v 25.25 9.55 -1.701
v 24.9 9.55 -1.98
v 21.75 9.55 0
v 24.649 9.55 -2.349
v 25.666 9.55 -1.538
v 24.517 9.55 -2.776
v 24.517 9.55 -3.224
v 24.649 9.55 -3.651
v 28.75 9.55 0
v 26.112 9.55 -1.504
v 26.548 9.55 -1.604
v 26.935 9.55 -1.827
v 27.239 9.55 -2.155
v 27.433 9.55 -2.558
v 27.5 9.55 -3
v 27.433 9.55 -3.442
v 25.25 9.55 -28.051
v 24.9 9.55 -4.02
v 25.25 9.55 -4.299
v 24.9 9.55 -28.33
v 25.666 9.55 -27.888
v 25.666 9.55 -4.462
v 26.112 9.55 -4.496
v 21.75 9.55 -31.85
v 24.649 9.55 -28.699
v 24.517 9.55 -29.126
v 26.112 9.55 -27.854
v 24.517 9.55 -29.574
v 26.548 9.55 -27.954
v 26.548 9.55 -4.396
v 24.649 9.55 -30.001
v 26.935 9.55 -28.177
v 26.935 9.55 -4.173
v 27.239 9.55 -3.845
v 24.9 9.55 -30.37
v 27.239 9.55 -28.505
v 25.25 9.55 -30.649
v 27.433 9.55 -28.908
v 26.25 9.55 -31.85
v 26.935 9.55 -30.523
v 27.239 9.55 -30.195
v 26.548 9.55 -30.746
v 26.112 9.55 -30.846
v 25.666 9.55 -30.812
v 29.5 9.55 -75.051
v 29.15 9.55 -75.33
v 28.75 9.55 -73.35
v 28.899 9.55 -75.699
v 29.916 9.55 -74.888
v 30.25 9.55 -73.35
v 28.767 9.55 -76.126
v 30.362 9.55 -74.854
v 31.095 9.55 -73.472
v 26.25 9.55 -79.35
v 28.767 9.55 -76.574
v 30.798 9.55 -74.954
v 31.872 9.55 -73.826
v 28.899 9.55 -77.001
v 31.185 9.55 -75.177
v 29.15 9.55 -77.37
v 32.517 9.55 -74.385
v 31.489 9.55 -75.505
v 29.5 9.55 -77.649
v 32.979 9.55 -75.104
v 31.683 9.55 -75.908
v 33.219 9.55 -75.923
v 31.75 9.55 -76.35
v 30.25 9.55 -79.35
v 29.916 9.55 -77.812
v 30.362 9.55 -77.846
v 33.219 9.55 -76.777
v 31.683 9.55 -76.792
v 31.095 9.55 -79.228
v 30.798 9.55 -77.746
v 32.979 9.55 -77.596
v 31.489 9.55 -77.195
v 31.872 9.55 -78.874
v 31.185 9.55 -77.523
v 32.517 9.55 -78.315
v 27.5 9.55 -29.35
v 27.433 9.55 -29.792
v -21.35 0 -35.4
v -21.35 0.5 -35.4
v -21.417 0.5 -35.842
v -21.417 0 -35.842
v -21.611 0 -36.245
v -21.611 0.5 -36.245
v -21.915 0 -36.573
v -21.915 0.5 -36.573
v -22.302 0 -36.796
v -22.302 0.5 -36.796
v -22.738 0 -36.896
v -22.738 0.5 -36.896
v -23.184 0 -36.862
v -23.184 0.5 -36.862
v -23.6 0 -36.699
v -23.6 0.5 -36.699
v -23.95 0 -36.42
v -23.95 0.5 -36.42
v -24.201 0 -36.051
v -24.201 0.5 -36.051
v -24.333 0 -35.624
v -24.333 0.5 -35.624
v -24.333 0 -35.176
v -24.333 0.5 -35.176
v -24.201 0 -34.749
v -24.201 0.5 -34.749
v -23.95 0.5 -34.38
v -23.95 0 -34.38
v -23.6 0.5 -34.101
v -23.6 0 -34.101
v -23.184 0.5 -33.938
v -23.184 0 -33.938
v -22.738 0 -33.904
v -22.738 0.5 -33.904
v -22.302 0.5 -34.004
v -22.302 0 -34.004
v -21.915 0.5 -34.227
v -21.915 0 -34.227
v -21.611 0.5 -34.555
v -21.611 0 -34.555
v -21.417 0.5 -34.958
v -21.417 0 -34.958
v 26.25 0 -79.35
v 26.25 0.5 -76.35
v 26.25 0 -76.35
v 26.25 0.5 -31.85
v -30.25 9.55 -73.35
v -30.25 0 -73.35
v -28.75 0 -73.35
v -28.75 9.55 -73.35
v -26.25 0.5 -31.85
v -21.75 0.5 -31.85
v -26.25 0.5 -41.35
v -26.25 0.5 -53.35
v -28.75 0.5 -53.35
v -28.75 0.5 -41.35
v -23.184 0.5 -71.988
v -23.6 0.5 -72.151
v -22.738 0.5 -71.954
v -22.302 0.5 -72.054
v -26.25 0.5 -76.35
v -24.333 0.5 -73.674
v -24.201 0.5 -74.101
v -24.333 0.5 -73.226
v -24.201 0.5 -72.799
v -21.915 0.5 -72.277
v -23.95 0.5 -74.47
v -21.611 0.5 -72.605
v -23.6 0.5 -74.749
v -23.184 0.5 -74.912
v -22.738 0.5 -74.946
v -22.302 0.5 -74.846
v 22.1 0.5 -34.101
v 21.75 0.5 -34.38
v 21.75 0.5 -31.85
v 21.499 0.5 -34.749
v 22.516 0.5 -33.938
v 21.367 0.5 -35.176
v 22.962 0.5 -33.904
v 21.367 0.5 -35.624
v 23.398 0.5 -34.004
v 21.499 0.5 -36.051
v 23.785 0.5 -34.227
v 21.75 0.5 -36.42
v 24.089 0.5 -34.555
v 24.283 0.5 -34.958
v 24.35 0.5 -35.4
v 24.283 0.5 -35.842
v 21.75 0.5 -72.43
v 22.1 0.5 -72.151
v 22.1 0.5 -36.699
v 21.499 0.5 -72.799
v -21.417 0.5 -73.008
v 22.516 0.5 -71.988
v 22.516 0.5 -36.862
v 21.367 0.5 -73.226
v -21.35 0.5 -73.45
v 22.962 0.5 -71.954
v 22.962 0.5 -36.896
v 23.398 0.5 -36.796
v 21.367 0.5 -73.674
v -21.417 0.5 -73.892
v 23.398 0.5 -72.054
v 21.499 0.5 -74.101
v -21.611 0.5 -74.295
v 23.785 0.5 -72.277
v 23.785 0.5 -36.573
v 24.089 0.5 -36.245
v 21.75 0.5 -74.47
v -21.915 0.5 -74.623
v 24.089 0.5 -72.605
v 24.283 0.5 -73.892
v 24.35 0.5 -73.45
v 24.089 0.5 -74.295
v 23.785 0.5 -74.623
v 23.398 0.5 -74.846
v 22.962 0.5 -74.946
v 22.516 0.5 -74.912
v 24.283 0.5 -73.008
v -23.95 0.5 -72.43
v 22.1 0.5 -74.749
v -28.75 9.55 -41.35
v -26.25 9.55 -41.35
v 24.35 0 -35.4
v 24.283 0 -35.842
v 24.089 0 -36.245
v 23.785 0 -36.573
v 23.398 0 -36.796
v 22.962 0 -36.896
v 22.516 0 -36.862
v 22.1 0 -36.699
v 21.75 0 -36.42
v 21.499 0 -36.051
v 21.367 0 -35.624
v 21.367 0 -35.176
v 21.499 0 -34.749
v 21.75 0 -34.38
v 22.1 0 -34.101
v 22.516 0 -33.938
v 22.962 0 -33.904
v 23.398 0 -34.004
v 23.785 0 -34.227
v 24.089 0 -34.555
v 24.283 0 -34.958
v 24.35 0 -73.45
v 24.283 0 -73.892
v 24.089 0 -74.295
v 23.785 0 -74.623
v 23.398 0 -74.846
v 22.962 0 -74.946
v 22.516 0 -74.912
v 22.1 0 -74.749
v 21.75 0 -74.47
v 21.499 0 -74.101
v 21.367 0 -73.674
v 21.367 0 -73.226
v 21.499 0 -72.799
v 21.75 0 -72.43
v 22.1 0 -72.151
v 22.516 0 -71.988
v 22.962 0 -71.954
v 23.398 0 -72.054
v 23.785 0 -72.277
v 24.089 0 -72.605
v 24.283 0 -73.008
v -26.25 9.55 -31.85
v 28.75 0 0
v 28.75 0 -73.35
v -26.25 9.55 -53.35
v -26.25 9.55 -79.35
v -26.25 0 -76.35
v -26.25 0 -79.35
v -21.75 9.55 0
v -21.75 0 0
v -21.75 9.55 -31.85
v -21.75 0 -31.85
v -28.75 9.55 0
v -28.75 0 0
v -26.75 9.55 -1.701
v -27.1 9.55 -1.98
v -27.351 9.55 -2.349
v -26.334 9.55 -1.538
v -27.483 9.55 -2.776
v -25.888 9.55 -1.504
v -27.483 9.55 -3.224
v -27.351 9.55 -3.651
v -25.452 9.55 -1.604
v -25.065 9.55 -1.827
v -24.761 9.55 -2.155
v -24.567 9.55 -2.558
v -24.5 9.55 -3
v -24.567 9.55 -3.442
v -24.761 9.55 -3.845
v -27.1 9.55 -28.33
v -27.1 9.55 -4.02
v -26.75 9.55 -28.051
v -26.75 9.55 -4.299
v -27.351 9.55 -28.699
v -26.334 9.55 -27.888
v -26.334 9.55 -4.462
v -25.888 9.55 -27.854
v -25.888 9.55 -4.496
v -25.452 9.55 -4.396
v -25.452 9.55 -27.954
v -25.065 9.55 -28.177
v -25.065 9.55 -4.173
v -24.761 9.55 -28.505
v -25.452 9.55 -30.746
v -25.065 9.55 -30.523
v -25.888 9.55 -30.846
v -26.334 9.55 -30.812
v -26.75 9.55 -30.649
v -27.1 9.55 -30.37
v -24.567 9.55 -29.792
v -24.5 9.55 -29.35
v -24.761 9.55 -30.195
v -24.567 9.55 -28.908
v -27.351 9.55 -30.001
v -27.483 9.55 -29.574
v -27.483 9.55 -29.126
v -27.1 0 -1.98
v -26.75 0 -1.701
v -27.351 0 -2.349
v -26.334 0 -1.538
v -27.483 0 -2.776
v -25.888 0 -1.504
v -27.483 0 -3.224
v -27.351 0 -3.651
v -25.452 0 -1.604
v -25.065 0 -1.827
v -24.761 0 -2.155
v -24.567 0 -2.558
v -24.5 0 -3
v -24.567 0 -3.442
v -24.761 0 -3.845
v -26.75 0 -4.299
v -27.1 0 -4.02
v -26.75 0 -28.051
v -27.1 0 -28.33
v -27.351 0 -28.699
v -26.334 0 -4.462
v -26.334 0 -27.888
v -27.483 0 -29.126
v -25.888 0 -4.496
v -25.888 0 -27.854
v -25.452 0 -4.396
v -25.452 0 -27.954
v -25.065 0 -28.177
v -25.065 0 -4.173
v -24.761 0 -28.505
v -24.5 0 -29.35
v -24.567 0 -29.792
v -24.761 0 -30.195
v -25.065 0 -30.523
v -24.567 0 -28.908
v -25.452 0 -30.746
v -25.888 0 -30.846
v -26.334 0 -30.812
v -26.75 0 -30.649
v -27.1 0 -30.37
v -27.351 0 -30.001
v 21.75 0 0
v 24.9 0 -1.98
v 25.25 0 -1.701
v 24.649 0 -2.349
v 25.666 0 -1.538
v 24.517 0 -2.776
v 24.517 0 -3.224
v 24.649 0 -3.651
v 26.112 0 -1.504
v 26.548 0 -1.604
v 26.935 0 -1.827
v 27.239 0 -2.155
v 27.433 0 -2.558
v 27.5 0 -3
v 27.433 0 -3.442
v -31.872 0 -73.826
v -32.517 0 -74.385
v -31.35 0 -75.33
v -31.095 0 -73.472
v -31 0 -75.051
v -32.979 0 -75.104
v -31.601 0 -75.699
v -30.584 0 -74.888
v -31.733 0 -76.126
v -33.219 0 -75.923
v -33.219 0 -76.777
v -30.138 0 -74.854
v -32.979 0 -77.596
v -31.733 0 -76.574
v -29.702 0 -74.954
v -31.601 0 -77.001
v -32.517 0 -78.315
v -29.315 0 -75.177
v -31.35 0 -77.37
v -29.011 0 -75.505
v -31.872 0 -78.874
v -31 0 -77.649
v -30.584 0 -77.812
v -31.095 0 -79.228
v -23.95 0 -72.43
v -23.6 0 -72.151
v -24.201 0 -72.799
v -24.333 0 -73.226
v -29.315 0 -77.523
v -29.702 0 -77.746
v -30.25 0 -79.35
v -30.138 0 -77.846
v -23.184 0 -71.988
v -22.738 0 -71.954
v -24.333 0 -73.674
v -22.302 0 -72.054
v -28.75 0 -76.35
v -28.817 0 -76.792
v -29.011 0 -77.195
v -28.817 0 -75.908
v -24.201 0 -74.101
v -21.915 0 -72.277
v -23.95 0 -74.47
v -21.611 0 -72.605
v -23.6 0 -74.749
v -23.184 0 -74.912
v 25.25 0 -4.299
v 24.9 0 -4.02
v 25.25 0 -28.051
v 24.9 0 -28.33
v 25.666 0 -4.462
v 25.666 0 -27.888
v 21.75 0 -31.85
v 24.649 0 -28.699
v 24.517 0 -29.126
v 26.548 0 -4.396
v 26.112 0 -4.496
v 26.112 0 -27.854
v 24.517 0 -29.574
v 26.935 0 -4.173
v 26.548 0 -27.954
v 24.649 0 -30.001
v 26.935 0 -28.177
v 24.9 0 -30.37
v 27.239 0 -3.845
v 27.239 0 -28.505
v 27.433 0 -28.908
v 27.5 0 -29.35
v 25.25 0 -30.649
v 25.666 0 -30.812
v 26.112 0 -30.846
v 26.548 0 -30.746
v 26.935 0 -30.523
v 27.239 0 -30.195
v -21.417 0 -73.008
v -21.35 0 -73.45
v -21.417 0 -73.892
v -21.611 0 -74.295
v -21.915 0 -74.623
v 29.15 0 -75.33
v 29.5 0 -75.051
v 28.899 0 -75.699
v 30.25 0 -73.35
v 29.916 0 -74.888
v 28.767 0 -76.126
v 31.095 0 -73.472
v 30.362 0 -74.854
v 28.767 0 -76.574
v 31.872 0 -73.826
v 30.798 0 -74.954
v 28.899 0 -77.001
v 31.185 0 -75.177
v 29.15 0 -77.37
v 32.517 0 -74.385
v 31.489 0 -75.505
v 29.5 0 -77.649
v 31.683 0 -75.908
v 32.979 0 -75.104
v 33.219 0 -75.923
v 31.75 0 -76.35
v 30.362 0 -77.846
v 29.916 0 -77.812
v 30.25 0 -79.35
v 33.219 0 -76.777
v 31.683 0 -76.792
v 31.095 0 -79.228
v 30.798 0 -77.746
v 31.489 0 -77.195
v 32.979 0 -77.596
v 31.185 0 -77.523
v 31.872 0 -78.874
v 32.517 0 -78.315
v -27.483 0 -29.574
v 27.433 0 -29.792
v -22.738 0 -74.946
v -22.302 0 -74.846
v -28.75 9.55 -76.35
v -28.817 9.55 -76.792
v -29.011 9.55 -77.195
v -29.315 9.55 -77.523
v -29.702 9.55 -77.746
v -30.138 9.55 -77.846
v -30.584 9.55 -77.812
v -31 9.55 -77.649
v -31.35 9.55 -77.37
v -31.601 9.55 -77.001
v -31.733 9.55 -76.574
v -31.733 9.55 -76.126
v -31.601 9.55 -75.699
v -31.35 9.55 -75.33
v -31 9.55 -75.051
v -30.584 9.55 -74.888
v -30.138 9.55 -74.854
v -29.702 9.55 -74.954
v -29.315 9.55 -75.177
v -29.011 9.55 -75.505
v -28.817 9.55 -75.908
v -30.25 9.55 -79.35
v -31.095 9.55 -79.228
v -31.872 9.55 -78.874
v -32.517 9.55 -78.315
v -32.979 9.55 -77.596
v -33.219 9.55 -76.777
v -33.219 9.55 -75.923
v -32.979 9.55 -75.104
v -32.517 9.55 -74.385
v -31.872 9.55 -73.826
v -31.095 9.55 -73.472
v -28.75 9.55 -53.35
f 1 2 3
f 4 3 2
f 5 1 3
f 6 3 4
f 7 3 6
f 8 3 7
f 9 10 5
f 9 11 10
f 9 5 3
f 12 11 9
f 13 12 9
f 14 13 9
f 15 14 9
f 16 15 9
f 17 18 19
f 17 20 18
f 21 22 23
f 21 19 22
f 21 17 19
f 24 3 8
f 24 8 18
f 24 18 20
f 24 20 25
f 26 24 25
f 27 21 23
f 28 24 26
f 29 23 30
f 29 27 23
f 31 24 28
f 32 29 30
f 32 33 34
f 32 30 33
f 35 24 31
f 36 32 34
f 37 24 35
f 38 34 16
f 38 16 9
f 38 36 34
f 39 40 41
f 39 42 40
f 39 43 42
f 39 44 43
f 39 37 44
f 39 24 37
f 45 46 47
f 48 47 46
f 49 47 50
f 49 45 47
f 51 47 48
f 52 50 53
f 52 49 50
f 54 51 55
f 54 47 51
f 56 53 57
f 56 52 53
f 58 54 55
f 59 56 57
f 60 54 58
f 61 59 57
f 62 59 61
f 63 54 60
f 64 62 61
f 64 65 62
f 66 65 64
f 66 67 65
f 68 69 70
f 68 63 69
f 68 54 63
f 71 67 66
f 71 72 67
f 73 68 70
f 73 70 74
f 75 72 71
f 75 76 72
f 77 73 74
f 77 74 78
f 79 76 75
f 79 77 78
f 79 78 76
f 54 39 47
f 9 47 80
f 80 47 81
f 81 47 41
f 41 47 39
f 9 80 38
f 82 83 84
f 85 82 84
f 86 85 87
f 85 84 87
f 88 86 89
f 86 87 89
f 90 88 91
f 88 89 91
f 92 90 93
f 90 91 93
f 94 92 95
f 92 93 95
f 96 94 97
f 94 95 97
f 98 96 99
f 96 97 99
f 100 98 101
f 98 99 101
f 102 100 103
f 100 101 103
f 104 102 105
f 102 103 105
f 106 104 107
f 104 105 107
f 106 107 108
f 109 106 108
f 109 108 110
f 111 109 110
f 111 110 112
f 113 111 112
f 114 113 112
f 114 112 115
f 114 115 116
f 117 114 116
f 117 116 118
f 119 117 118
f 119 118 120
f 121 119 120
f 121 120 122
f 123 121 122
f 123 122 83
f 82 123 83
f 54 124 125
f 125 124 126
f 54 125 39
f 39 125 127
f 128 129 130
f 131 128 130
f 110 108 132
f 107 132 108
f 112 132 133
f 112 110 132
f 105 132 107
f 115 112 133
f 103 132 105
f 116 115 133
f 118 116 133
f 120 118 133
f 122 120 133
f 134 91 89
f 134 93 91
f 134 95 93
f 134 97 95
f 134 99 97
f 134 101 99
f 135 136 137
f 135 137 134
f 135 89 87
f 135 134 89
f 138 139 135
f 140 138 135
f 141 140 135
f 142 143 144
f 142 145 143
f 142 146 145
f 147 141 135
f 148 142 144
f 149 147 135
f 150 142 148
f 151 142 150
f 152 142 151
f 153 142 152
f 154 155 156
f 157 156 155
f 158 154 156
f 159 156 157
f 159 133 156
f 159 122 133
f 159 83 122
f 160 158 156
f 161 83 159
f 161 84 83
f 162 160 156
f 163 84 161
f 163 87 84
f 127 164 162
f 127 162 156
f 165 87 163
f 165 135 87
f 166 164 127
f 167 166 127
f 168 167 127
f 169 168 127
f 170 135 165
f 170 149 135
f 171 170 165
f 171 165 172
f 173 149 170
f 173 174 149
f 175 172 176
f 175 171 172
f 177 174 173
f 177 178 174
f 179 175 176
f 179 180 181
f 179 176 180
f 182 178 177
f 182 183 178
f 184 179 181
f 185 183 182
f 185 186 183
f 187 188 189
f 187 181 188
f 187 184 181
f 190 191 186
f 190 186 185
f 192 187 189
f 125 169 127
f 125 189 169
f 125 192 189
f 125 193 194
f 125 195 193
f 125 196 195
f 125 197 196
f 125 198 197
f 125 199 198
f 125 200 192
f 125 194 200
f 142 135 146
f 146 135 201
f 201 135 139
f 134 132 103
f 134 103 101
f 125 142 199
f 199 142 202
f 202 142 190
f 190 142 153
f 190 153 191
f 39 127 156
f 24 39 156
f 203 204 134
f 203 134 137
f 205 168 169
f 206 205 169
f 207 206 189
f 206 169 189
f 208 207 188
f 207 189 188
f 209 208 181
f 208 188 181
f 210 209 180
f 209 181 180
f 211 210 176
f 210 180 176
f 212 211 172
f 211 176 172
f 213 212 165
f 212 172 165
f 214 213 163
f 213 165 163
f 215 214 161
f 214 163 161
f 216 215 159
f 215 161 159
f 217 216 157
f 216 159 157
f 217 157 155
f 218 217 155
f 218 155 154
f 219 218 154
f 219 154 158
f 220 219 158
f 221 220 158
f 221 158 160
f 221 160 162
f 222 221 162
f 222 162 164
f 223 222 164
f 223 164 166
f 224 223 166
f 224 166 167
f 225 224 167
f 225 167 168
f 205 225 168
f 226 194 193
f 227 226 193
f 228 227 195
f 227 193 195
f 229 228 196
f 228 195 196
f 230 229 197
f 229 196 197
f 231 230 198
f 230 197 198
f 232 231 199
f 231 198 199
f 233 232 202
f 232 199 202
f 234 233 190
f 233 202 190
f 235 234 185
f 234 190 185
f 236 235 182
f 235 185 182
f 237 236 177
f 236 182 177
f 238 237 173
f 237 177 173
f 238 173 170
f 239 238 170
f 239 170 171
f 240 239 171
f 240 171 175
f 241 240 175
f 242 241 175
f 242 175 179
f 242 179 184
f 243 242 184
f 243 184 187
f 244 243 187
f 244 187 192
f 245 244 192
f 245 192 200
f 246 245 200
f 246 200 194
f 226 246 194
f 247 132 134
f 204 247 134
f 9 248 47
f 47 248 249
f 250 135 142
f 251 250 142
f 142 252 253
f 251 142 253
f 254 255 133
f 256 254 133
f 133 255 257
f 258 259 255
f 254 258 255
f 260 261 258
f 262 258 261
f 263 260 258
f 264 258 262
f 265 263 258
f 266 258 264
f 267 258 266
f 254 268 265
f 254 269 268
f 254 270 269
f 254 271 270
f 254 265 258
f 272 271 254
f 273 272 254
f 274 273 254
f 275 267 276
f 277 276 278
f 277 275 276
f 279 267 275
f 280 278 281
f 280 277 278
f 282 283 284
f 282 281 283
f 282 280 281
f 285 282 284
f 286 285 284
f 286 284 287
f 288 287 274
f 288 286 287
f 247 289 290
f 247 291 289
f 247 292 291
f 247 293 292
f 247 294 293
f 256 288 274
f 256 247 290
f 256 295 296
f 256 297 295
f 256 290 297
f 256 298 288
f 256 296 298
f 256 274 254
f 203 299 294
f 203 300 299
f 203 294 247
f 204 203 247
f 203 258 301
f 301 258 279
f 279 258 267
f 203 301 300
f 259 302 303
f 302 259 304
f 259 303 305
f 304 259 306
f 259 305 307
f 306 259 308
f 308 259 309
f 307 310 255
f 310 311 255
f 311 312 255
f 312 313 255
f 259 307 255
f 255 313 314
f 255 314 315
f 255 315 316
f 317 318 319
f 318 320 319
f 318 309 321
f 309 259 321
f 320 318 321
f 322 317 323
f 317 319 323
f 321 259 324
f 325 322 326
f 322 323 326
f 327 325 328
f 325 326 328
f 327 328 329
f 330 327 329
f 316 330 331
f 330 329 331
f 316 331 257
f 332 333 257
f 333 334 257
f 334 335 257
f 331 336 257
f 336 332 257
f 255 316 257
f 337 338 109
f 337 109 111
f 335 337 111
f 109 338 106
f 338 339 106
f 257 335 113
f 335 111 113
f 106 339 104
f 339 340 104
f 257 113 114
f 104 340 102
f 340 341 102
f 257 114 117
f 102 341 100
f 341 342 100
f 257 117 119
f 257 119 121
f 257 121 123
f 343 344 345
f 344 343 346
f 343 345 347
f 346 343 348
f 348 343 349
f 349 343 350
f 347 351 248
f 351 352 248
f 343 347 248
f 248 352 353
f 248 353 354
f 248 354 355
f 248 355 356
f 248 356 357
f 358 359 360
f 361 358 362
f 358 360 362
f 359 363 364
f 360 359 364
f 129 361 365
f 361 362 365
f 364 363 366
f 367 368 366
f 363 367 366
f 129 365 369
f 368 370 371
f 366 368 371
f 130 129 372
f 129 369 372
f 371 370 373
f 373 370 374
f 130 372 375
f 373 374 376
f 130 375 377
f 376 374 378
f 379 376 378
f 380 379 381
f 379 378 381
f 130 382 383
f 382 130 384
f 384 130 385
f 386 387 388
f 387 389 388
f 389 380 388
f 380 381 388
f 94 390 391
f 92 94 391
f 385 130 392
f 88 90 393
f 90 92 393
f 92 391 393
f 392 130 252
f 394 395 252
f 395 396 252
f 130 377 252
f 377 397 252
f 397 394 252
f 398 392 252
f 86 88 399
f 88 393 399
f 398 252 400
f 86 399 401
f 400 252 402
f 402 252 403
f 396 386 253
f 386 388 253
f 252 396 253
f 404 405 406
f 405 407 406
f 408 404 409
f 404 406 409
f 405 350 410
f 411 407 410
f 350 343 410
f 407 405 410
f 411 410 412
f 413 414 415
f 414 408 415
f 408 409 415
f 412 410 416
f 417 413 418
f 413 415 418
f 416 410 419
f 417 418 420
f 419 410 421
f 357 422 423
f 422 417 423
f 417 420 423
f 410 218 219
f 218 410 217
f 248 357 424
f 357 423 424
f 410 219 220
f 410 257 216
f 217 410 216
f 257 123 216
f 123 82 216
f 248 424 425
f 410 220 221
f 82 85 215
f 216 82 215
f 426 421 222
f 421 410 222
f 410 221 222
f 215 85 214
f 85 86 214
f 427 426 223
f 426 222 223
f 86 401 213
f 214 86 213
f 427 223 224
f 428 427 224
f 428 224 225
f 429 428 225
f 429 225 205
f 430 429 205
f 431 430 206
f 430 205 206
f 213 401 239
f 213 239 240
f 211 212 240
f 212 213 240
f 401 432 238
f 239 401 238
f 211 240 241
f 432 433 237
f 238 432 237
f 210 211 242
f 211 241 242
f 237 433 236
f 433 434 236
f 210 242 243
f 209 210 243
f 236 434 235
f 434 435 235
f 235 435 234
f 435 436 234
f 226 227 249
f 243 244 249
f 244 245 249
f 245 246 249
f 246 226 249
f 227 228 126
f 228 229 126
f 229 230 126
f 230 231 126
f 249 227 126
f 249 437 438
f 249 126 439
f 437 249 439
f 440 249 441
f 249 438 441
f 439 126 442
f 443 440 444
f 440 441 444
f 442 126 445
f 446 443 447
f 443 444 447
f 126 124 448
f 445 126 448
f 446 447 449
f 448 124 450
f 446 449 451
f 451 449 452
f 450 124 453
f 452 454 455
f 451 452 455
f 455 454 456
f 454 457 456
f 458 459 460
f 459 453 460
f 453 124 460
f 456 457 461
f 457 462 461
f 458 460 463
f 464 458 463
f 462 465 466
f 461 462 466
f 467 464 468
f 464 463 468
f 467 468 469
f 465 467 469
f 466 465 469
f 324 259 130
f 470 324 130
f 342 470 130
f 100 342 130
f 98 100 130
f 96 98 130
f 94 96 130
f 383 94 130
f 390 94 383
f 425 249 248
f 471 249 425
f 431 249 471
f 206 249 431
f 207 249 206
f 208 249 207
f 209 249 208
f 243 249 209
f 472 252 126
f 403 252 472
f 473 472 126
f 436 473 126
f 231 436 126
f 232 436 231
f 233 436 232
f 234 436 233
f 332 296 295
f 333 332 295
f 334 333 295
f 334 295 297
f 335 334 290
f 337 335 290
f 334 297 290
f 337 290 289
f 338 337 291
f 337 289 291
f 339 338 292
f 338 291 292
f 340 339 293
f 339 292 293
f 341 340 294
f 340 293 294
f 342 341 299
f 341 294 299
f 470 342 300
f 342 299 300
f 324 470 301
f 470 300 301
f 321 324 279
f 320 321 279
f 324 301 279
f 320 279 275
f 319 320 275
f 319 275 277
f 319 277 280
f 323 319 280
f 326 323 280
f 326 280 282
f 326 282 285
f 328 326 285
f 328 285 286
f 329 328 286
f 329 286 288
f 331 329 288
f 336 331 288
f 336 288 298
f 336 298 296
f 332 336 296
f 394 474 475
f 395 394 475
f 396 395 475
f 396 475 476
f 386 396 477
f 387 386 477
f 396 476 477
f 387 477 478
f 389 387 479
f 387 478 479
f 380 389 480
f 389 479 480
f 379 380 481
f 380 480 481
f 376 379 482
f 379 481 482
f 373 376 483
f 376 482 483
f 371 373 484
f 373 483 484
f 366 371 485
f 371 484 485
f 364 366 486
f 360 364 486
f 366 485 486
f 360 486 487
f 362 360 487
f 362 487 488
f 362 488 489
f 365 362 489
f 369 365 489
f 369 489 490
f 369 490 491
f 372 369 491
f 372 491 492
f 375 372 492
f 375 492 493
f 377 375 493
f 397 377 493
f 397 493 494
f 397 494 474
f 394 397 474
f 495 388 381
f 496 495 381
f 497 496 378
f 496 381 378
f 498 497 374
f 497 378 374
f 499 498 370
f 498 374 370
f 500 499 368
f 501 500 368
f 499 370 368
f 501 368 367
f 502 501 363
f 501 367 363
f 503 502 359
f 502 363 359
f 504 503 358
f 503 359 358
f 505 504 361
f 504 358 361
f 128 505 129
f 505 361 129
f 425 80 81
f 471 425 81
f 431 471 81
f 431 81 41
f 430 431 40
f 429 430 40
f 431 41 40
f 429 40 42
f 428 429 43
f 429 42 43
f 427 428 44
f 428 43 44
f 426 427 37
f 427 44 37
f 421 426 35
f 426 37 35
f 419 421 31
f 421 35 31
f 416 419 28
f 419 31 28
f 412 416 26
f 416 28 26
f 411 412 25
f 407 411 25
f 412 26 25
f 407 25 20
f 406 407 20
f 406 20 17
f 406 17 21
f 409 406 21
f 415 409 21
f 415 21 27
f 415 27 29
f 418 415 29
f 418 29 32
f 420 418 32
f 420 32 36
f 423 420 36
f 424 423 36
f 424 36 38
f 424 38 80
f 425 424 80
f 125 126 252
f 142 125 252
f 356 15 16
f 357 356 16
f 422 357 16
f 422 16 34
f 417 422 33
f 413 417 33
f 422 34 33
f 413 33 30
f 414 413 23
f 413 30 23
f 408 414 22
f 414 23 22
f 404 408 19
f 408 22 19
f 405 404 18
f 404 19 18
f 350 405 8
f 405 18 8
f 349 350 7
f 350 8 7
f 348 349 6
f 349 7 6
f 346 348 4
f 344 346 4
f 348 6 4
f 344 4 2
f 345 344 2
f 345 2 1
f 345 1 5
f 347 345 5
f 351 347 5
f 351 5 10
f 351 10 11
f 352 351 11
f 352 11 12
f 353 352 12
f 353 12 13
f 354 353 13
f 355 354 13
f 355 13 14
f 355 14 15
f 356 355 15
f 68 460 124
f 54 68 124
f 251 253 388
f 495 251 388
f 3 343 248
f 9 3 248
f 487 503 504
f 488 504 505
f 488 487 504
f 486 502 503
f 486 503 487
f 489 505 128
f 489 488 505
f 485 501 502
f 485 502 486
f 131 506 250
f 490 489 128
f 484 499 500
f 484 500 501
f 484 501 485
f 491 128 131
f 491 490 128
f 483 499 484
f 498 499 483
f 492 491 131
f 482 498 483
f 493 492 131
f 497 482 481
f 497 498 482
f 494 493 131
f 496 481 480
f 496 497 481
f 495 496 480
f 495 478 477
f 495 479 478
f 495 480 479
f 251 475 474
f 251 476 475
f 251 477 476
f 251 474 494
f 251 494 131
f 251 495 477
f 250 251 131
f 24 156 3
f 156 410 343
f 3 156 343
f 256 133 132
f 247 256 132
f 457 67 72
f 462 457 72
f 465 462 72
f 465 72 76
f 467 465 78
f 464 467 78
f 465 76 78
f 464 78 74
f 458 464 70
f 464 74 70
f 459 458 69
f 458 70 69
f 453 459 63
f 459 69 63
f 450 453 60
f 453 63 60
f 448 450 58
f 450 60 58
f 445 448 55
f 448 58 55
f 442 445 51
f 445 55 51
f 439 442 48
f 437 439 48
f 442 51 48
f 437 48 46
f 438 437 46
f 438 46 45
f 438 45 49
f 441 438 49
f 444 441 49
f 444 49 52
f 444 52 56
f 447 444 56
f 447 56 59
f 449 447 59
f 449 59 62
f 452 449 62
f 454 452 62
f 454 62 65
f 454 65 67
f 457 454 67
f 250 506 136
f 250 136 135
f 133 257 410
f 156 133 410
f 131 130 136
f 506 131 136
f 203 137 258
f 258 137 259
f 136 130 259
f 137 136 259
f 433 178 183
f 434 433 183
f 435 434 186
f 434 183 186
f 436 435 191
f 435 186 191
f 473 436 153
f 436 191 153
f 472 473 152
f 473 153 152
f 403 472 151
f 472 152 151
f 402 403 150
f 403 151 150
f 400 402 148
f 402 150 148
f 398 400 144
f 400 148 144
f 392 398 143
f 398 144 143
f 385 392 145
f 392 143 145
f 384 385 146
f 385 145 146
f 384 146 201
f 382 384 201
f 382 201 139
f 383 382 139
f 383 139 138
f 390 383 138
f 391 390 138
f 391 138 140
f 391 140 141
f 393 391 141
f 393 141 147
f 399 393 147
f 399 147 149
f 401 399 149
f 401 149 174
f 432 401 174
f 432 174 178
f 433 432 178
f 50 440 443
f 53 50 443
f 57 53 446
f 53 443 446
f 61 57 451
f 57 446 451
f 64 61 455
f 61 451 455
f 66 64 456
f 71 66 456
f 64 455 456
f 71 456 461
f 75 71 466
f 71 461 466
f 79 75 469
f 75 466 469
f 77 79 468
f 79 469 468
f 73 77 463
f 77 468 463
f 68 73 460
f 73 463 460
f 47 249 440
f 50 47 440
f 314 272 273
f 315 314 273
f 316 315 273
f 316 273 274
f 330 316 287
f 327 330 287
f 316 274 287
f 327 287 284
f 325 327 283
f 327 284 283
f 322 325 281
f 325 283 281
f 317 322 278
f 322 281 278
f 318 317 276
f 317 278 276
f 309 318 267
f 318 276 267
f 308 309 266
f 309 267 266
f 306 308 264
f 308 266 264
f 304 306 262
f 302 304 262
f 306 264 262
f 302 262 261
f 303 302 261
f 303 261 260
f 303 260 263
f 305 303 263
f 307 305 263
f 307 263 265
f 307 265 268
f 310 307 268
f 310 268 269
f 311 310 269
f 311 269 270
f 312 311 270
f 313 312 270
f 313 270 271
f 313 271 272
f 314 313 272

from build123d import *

# Parameters (mm, degrees)
BOSS_EXTRUDE1_DEPTH          = 0.5
BOSS_EXTRUDE2_DEPTH          = 9.55
F_3_0_3_DIAMETER_HOLE1_D     = 3
F_3_0_3_DIAMETER_HOLE1_DEPTH = 12
F_3_0_3_DIAMETER_HOLE1_TIP   = 0.901290929


with BuildPart() as part:
    # Sketch1 → Boss-Extrude1 (new body)
    with BuildSketch(Plane(origin=(0, 0, 0), x_dir=(1, 0, 0), z_dir=(0, 1, 0))):
        Polygon((26.25, 31.85), (26.25, 76.35), (-26.25, 76.35), (-26.25, 53.35), (-28.75, 53.35), (-28.75, 41.35), (-26.25, 41.35), (-26.25, 31.85), align=None)
    extrude(amount=BOSS_EXTRUDE1_DEPTH)

    # Sketch1<3> → Boss-Extrude2 (add)
    with BuildSketch(Plane(origin=(0, 0, 0), x_dir=(1, 0, 0), z_dir=(0, 1, 0))):
        with BuildLine():
            Line((-26.25, 79.35), (-30.25, 79.35))
            ThreePointArc((-30.25, 79.35), (-33.25, 76.35), (-30.25, 73.35))
            Line((-30.25, 73.35), (-28.75, 73.35))
            Line((-28.75, 73.35), (-28.75, 53.35))
            Line((-28.75, 53.35), (-26.25, 53.35))
            Line((-26.25, 53.35), (-26.25, 79.35))
        make_face()
        with BuildLine():
            Line((26.25, 79.35), (26.25, 31.85))
            Line((26.25, 31.85), (21.75, 31.85))
            Line((21.75, 31.85), (21.75, 0))
            Line((21.75, 0), (28.75, 0))
            Line((28.75, 0), (28.75, 73.35))
            Line((28.75, 73.35), (30.25, 73.35))
            ThreePointArc((30.25, 73.35), (33.25, 76.35), (30.25, 79.35))
            Line((30.25, 79.35), (26.25, 79.35))
        make_face()
        Polygon((-26.25, 31.85), (-26.25, 41.35), (-28.75, 41.35), (-28.75, 0), (-21.75, 0), (-21.75, 31.85), align=None)
    extrude(amount=BOSS_EXTRUDE2_DEPTH)

    # Ø3.0 (3) Diameter Hole1
    with Locations(Plane(origin=(0, 0, 0), x_dir=(-1, 0, 0), z_dir=(0, -1, 0))):
        with Locations((-22.85, 73.45), (22.85, 73.45), (26, 29.35), (22.85, 35.4), (-22.85, 35.4), (-26, 29.35), (-26, 3), (26, 3), (-30.25, 76.35), (30.25, 76.35)):
            Hole(F_3_0_3_DIAMETER_HOLE1_D / 2, depth=F_3_0_3_DIAMETER_HOLE1_DEPTH)
            with Locations((0, 0, -(F_3_0_3_DIAMETER_HOLE1_DEPTH + F_3_0_3_DIAMETER_HOLE1_TIP / 2))):  # 118° drill point
                Cone(0, F_3_0_3_DIAMETER_HOLE1_D / 2, F_3_0_3_DIAMETER_HOLE1_TIP, mode=Mode.SUBTRACT)


solid = part.part
